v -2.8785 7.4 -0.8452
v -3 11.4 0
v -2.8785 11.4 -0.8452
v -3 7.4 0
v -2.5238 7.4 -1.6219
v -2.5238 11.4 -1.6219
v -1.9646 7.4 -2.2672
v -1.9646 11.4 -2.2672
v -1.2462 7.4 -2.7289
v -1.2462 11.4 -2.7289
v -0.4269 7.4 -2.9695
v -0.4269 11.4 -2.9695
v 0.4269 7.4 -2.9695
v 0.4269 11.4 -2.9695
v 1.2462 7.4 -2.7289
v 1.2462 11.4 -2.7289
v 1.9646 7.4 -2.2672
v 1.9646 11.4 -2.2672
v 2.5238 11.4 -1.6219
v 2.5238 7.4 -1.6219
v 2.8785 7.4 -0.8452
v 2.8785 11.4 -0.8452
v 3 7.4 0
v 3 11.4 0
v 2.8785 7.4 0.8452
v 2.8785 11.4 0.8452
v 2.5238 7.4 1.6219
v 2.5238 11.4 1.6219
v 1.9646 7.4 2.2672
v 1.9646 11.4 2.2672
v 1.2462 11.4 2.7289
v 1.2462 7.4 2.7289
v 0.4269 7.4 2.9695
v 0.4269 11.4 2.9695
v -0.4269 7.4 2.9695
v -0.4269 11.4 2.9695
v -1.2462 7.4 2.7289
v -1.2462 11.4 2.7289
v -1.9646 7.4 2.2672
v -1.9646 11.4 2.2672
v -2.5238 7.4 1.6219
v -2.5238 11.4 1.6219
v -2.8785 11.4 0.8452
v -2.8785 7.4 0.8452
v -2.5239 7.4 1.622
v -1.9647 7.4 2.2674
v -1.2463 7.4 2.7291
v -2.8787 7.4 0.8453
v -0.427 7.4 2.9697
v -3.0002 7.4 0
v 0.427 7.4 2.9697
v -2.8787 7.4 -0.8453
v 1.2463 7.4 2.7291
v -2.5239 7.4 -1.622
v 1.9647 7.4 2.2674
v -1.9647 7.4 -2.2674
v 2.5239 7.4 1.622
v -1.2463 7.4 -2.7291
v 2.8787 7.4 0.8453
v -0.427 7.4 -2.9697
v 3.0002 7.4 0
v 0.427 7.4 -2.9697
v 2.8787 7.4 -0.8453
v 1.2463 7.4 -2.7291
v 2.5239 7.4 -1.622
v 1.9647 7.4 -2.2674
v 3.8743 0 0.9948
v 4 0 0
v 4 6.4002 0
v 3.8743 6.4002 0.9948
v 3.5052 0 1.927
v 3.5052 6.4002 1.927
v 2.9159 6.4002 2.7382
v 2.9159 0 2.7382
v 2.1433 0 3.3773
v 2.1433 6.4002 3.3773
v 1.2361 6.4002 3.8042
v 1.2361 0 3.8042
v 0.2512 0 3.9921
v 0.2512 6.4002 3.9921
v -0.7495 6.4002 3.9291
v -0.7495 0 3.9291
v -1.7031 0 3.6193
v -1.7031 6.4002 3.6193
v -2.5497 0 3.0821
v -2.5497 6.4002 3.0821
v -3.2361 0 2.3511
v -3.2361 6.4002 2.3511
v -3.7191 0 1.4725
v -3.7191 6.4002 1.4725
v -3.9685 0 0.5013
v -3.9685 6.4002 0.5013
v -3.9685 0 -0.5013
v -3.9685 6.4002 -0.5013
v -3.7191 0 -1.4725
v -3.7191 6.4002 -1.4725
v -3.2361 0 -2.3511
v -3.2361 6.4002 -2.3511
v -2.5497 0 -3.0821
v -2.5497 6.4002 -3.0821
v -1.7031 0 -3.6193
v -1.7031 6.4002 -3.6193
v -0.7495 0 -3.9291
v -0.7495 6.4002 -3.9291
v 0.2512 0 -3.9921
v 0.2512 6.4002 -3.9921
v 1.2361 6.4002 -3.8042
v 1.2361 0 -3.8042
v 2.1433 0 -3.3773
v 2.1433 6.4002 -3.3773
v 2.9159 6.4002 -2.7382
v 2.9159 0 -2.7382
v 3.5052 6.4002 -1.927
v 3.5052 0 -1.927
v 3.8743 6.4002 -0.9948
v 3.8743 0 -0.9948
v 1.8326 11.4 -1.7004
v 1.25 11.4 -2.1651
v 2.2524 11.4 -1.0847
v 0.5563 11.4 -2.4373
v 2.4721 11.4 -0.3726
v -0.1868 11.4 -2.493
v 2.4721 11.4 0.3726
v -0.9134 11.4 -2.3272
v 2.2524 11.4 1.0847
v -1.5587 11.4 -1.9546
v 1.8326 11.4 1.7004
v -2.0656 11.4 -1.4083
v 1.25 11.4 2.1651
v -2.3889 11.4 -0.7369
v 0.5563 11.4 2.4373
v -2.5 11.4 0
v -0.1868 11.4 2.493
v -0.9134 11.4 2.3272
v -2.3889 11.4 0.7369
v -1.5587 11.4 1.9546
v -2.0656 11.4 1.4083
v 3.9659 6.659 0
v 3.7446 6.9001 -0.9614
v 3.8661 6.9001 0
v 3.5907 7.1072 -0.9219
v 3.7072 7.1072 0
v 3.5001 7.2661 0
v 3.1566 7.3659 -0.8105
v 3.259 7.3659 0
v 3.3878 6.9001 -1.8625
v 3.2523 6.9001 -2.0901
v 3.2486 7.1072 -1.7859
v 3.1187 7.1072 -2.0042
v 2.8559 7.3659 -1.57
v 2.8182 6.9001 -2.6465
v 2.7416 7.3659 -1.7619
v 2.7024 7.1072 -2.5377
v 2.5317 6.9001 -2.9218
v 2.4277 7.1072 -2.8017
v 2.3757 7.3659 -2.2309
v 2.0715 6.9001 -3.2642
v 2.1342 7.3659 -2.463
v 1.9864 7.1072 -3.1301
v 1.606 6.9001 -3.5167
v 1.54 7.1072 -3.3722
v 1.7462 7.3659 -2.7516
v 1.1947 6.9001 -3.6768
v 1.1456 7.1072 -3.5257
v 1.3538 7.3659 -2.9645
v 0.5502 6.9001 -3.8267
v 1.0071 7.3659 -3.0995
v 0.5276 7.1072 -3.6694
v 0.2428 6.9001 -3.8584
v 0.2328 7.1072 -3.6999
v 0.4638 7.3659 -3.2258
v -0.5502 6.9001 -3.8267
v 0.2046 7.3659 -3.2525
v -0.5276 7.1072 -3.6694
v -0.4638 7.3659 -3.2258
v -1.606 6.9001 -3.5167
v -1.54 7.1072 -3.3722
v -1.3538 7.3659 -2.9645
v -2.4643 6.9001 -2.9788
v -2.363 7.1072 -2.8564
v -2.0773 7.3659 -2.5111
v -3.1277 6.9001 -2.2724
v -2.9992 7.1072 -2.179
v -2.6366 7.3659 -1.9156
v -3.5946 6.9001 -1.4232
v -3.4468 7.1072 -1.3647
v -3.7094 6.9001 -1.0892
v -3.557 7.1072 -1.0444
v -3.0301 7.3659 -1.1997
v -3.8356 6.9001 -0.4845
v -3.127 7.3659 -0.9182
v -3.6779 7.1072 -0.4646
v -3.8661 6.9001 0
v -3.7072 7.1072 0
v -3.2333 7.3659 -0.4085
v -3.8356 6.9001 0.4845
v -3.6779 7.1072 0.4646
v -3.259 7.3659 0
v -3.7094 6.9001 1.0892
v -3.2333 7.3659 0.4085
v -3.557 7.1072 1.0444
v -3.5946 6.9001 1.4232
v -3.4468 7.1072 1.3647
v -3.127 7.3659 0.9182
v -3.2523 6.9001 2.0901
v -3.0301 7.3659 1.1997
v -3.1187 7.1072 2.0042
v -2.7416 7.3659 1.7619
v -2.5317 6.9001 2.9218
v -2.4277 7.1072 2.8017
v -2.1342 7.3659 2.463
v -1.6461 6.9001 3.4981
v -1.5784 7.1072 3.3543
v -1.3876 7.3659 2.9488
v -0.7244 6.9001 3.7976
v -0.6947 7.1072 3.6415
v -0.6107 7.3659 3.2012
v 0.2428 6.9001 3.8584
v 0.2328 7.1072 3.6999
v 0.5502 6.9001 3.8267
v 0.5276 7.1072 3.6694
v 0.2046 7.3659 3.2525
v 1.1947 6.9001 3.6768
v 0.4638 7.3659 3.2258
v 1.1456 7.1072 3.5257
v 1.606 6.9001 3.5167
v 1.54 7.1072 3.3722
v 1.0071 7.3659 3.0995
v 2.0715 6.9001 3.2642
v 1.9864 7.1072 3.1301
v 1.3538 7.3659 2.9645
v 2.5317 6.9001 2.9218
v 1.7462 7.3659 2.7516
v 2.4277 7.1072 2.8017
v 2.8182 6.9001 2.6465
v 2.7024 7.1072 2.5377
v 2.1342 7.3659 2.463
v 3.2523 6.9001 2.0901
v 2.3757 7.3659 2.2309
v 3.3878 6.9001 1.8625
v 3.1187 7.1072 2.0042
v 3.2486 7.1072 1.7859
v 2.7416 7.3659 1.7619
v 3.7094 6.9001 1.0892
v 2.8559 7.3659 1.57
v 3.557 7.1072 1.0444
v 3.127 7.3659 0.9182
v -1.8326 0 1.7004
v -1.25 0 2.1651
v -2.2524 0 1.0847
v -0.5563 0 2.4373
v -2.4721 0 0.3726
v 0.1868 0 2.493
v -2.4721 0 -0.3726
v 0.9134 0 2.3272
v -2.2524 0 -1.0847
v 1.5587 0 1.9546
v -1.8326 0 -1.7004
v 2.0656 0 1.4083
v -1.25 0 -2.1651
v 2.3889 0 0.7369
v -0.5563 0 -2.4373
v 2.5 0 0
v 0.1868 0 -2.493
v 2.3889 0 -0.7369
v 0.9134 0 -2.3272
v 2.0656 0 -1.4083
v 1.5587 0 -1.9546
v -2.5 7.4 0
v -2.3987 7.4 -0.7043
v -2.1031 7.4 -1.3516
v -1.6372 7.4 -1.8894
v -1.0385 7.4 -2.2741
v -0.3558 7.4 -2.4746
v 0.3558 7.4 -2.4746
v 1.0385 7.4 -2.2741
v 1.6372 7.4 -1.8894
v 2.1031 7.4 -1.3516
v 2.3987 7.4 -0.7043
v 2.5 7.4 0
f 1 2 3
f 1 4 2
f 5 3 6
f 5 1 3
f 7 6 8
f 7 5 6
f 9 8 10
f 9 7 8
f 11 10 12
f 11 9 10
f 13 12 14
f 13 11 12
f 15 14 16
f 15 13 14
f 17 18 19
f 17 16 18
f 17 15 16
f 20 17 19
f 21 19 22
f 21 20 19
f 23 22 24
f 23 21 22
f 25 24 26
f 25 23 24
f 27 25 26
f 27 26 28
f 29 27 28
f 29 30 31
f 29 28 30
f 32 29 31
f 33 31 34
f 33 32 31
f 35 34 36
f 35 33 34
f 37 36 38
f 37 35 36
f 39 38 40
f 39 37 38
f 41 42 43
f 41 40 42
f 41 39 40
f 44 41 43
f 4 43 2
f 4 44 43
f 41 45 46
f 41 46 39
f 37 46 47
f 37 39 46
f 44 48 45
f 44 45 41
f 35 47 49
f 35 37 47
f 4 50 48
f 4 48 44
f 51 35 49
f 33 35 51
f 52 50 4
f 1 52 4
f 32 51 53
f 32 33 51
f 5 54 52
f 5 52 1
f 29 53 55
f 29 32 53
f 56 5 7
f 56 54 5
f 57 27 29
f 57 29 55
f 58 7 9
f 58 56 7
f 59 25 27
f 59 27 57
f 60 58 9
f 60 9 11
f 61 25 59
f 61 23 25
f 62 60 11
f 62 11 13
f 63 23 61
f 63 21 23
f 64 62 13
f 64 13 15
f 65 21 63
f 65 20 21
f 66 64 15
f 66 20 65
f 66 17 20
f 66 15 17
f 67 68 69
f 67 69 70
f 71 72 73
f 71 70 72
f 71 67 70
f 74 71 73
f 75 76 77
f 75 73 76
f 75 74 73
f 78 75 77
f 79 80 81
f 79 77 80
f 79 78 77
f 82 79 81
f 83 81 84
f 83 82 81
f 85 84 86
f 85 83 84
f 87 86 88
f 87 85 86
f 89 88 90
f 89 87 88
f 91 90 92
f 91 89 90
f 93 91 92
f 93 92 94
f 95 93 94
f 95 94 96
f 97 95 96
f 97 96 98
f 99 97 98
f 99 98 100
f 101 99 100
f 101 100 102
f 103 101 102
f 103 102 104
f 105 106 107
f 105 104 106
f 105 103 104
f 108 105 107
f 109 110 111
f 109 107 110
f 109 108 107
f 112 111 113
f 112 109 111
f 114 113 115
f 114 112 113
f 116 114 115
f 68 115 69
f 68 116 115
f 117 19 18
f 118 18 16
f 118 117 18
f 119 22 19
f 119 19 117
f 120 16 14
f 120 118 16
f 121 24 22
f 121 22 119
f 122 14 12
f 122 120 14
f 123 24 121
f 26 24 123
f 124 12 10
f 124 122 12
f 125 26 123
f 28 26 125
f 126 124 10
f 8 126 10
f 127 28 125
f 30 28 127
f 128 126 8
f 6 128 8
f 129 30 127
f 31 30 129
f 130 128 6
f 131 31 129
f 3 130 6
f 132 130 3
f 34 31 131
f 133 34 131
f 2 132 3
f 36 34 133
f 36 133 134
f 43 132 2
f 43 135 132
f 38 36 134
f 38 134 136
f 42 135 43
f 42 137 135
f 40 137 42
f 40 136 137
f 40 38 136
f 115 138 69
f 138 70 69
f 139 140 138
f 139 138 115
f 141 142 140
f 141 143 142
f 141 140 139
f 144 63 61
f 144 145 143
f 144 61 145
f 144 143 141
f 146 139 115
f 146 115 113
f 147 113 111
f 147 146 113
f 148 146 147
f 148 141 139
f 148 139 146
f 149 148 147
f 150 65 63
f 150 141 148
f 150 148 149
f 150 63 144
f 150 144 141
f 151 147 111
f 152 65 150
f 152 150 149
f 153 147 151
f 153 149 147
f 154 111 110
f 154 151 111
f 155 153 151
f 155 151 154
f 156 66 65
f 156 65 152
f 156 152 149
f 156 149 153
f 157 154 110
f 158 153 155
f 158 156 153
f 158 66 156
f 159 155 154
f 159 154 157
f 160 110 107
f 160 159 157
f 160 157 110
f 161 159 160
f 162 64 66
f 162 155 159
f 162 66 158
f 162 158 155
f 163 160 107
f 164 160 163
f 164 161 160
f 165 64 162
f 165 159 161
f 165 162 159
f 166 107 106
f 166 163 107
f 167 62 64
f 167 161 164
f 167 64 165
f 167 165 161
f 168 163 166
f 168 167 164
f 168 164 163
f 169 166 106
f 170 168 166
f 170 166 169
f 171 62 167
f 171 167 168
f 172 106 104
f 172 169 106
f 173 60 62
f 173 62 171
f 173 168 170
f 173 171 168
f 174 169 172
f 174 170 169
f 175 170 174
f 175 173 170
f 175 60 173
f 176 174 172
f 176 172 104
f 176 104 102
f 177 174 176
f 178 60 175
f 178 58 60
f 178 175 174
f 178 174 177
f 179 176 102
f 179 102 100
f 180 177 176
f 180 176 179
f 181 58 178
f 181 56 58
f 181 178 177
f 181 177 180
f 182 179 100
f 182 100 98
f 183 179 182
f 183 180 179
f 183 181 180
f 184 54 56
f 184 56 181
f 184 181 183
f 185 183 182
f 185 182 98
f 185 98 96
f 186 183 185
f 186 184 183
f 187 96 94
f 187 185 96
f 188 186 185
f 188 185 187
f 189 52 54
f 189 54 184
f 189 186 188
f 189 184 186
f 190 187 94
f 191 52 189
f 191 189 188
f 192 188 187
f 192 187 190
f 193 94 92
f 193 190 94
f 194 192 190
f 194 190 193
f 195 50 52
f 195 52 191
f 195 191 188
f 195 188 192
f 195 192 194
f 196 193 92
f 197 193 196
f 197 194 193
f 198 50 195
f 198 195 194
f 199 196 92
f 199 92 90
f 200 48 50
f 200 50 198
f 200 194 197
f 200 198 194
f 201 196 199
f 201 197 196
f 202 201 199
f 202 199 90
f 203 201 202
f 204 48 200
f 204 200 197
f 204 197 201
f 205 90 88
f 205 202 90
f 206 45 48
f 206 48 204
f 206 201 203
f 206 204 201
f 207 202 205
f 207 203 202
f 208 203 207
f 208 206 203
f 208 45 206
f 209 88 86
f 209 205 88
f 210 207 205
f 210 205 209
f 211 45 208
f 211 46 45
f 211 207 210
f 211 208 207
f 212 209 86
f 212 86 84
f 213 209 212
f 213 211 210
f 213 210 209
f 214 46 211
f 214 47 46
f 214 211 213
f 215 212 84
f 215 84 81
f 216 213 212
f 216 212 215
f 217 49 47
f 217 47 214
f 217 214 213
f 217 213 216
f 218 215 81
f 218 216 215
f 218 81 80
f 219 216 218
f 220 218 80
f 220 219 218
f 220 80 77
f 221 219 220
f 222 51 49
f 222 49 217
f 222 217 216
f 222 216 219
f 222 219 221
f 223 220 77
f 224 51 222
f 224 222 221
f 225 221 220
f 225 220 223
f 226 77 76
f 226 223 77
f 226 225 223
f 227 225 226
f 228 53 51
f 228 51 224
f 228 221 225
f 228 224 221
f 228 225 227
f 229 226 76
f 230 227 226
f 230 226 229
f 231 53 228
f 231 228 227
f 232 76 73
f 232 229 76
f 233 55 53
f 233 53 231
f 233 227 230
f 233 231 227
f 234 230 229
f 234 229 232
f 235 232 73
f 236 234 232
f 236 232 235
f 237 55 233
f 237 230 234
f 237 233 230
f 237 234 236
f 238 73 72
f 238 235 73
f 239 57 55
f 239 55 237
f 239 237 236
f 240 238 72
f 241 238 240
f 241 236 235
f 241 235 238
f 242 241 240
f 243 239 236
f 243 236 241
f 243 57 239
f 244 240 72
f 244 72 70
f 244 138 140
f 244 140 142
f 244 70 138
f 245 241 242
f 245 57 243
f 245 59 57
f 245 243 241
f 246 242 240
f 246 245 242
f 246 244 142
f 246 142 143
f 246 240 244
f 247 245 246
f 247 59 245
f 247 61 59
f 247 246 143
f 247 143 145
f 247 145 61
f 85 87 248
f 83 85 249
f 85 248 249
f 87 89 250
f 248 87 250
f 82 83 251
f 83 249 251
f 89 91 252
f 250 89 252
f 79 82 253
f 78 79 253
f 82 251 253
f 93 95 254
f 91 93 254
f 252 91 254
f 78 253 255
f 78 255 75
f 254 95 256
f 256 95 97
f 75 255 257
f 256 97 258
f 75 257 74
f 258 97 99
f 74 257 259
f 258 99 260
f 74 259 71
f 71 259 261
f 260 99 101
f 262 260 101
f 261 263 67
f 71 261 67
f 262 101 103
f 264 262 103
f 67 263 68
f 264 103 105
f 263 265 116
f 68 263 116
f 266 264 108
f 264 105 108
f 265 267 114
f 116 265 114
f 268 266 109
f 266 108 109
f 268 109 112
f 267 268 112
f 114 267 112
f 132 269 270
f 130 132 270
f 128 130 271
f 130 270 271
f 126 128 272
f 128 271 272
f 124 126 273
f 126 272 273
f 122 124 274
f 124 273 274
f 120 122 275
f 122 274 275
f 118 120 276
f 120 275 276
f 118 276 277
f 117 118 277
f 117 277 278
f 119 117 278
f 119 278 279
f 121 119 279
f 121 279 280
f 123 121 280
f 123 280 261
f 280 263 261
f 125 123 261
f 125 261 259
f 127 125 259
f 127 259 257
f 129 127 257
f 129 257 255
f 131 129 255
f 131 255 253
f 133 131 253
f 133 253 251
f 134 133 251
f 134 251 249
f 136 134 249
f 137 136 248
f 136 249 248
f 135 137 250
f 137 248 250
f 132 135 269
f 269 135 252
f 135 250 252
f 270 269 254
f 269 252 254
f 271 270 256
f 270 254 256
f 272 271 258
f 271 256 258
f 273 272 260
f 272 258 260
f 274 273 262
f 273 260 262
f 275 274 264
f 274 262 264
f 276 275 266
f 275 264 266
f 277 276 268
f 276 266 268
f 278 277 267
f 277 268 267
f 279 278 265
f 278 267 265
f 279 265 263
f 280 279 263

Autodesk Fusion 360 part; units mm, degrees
sketch "Sketch1" plane through (0, 0, 0) normal (0, 1, 0) x (1, 0, 0)
  circle A0 centre (0, 0) radius 2.5
  circle A1 centre (0, 0) radius 4
  dimension "d1" = 5
  dimension "d2" = 8
extrude "Extrude1" add sketch "Sketch1" along normal blind 7.4
sketch "Sketch2" plane through (0, 7.4, 0) normal (0, 1, 0) x (-1, 0, 0)
  circle A0 centre (0, 0) radius 2.5
  circle A1 centre (0, 0) radius 4
  circle A2 centre (0, 0) radius 3
  dimension "d5" = 6
extrude "Extrude2" add sketch "Sketch2" along normal blind 4 contours A2
fillet "Fillet1" radius 1 1 edges at (-3.7293, 7.4, 1.4465)
